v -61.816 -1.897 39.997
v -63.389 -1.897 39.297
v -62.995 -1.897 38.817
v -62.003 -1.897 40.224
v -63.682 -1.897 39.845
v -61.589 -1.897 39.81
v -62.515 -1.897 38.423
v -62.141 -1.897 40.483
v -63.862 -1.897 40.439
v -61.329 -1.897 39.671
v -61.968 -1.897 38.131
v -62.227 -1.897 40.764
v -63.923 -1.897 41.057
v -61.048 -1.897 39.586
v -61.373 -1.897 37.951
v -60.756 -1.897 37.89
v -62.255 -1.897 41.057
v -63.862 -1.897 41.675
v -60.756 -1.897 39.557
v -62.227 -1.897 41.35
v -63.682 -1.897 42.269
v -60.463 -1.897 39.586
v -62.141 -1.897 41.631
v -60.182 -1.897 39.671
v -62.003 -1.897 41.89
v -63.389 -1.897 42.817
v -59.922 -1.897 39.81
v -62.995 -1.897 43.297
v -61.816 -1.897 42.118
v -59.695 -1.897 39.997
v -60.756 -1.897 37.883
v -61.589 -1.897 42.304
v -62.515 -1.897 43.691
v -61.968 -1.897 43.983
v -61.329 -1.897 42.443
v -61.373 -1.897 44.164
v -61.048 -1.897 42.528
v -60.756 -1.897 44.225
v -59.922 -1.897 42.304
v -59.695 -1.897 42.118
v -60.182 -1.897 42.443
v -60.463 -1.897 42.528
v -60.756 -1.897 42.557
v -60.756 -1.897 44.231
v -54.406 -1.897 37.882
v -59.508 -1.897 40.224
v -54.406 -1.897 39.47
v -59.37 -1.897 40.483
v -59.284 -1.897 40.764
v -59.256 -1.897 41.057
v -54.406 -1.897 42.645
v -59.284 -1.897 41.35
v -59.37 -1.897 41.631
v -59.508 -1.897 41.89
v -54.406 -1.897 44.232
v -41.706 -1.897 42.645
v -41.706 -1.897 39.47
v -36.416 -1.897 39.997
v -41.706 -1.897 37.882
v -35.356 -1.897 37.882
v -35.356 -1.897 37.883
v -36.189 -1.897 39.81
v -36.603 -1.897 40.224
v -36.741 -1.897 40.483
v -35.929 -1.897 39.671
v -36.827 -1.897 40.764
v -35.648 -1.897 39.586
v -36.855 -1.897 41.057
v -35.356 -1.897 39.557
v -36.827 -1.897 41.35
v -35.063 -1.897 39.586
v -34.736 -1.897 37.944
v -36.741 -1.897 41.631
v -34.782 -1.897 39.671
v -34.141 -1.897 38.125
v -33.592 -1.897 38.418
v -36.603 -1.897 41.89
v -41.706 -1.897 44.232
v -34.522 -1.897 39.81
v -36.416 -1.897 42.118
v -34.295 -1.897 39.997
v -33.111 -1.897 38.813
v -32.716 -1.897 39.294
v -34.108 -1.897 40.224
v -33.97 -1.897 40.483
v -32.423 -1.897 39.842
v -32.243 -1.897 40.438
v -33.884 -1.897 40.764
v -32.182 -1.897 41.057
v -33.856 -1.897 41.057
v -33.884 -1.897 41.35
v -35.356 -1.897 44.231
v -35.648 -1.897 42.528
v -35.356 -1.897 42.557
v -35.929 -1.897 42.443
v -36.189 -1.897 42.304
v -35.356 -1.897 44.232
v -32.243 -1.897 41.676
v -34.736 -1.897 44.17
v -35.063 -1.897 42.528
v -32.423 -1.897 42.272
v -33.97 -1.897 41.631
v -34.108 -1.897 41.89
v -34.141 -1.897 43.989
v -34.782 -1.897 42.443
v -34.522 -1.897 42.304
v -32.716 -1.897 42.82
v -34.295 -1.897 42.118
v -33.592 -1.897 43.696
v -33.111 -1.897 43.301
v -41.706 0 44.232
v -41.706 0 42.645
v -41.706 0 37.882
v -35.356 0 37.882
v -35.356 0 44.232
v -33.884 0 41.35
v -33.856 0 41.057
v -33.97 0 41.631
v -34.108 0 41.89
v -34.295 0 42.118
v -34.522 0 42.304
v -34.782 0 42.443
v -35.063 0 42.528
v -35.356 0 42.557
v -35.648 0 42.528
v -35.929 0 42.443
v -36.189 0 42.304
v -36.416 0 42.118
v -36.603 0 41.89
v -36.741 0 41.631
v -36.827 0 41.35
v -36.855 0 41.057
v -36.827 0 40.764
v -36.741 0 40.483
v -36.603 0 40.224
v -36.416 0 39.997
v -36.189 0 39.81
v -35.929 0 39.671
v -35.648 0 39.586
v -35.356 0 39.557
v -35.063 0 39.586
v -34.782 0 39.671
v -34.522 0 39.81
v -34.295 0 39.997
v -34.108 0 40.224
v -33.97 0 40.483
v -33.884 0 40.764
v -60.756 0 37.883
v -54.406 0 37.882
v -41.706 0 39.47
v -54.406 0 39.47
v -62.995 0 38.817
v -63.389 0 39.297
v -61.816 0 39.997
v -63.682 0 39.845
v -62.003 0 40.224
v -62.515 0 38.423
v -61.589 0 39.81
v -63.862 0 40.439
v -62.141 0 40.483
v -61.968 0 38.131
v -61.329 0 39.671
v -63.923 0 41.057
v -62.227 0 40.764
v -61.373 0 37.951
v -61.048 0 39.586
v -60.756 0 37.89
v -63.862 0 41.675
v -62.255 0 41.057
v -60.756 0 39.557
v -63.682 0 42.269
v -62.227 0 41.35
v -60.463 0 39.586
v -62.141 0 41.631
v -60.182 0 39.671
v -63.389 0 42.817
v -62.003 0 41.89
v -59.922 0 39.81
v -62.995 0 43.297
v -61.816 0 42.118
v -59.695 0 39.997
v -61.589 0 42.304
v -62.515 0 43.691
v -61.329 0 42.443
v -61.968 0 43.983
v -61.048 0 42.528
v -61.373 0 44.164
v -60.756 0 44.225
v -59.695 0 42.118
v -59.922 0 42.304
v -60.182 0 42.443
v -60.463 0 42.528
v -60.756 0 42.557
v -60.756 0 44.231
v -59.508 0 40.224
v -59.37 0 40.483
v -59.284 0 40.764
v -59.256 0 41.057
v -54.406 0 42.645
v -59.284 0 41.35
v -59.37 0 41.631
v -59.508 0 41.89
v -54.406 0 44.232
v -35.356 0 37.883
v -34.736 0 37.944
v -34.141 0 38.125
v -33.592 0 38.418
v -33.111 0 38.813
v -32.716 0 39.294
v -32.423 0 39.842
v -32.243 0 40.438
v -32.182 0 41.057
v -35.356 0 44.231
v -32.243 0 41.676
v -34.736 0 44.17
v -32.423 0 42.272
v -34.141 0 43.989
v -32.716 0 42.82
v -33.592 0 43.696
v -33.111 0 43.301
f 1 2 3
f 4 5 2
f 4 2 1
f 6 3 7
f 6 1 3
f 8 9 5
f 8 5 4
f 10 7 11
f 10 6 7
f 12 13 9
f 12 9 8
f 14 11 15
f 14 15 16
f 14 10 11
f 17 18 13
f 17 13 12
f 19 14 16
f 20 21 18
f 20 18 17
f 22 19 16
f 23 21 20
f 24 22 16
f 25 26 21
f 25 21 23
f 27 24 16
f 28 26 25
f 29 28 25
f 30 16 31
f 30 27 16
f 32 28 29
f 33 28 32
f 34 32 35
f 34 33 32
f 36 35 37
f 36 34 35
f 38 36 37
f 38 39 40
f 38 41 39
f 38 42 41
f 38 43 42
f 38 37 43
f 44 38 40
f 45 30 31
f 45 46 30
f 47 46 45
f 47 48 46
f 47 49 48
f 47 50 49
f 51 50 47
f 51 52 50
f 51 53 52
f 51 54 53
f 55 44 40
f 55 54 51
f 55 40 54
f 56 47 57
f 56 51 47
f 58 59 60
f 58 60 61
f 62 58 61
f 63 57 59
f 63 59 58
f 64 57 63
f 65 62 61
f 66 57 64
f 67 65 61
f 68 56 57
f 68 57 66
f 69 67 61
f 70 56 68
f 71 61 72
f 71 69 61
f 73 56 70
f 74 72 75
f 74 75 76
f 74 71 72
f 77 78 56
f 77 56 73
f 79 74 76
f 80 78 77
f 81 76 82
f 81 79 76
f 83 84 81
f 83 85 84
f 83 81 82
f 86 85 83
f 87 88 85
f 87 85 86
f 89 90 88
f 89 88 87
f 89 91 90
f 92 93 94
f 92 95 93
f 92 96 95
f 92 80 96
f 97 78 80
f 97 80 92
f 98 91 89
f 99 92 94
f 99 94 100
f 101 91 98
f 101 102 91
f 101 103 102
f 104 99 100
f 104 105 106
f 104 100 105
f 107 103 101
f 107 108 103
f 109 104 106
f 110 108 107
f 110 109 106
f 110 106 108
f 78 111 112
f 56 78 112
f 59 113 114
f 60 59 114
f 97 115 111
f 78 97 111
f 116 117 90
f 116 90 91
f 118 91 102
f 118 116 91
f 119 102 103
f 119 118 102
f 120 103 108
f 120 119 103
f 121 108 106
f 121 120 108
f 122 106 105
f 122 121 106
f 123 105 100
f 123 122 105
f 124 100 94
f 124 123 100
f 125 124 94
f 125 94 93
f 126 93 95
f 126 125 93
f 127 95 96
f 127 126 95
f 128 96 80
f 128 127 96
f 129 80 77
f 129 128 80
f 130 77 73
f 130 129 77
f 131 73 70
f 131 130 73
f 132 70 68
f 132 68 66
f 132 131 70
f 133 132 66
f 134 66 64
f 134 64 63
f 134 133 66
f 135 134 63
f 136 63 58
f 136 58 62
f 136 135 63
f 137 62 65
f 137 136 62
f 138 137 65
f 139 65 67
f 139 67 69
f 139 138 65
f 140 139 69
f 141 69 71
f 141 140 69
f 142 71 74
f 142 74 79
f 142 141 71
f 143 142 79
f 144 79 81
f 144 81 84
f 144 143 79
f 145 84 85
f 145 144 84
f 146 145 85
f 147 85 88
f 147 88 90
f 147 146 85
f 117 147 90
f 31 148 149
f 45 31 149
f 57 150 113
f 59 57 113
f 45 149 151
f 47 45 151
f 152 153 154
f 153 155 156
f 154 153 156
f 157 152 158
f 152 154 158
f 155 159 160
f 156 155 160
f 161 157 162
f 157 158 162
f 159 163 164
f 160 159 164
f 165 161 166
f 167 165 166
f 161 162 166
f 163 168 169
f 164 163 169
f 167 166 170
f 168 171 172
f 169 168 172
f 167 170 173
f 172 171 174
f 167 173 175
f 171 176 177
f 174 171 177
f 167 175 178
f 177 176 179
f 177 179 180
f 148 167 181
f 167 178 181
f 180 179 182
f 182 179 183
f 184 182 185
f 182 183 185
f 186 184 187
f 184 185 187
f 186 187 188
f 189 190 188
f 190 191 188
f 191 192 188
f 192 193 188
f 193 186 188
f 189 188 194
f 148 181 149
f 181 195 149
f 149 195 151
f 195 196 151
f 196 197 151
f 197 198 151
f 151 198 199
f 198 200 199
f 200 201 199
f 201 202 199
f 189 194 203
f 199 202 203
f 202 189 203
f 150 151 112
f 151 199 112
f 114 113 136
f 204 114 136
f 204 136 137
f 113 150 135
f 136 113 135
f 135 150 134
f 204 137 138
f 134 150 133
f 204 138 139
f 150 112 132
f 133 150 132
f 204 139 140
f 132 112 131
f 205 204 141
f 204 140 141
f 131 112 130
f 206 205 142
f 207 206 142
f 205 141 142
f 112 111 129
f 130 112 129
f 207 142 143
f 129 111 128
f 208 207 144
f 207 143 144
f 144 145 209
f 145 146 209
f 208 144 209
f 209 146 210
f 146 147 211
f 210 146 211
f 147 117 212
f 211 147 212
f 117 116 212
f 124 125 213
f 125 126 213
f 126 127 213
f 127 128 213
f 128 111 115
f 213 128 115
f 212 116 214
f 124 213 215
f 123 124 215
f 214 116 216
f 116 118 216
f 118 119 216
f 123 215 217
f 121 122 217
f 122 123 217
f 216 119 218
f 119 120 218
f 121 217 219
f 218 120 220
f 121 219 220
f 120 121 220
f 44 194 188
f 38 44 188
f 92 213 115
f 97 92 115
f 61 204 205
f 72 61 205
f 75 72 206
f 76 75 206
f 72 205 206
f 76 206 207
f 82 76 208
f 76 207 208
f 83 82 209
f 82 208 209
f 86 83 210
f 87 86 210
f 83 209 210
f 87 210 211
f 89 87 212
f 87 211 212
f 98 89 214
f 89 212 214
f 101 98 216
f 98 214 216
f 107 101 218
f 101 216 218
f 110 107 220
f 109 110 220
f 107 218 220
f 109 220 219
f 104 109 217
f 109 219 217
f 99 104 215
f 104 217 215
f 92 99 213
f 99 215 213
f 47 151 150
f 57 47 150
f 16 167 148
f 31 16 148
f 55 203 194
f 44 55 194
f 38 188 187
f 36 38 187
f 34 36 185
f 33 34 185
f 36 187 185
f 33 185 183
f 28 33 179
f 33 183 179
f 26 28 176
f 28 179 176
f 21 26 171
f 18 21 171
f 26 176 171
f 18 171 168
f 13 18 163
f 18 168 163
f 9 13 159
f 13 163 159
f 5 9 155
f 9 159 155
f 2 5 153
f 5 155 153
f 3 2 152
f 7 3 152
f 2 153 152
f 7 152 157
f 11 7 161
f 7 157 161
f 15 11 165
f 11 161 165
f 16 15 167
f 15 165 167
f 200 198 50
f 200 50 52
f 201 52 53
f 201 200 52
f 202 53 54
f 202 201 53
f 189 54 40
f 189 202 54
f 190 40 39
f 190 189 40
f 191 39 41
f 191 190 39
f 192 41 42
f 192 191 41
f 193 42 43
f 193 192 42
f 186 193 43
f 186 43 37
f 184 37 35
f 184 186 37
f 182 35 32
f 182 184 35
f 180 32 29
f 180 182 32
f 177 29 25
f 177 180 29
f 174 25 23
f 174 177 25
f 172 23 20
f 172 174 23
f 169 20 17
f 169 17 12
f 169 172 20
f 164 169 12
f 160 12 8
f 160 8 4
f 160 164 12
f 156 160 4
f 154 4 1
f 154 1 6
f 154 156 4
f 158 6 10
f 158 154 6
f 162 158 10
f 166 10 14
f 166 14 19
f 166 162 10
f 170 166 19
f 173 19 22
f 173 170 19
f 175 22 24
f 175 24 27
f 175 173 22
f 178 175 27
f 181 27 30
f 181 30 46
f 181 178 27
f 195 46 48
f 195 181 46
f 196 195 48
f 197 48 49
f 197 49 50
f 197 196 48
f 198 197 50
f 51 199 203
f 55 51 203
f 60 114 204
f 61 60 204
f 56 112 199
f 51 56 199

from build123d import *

# Parameters (mm, degrees)
F0_R     = 1.49987
F1_DEPTH = 1.89738


with BuildPart() as f1:
    # F0 (on Front) → F1 (new body)
    with BuildSketch(Plane.XZ):
        with BuildLine():
            Line((-35.355524, 44.232099), (-41.705524, 44.232099))
            Line((-41.705524, 44.232099), (-41.705524, 42.644599))
            Line((-41.705524, 42.644599), (-54.405524, 42.644599))
            Line((-54.405524, 42.644599), (-54.405524, 44.232099))
            Line((-54.405524, 44.232099), (-60.755524, 44.231093))
            Line((-60.755524, 44.231093), (-60.755524, 44.224526))
            ThreePointArc((-60.755524, 44.224526), (-63.922951, 41.057099), (-60.755524, 37.889672))
            Line((-60.755524, 37.889672), (-60.755524, 37.883105))
            Line((-60.755524, 37.883105), (-54.405524, 37.882099))
            Line((-54.405524, 37.882099), (-54.405524, 39.469599))
            Line((-54.405524, 39.469599), (-41.705524, 39.469599))
            Line((-41.705524, 39.469599), (-41.705524, 37.882099))
            Line((-41.705524, 37.882099), (-35.355524, 37.882099))
            Line((-35.355524, 37.882099), (-35.355524, 37.883105))
            ThreePointArc((-35.355524, 37.883105), (-32.18153, 41.057099), (-35.355524, 44.231093))
            Line((-35.355524, 44.231093), (-35.355524, 44.232099))
        make_face()
        with Locations((-60.755524, 41.057099)):
            Circle(F0_R, mode=Mode.SUBTRACT)
        with Locations((-35.355524, 41.057099)):
            Circle(F0_R, mode=Mode.SUBTRACT)
    extrude(amount=F1_DEPTH)


solid = f1.part
